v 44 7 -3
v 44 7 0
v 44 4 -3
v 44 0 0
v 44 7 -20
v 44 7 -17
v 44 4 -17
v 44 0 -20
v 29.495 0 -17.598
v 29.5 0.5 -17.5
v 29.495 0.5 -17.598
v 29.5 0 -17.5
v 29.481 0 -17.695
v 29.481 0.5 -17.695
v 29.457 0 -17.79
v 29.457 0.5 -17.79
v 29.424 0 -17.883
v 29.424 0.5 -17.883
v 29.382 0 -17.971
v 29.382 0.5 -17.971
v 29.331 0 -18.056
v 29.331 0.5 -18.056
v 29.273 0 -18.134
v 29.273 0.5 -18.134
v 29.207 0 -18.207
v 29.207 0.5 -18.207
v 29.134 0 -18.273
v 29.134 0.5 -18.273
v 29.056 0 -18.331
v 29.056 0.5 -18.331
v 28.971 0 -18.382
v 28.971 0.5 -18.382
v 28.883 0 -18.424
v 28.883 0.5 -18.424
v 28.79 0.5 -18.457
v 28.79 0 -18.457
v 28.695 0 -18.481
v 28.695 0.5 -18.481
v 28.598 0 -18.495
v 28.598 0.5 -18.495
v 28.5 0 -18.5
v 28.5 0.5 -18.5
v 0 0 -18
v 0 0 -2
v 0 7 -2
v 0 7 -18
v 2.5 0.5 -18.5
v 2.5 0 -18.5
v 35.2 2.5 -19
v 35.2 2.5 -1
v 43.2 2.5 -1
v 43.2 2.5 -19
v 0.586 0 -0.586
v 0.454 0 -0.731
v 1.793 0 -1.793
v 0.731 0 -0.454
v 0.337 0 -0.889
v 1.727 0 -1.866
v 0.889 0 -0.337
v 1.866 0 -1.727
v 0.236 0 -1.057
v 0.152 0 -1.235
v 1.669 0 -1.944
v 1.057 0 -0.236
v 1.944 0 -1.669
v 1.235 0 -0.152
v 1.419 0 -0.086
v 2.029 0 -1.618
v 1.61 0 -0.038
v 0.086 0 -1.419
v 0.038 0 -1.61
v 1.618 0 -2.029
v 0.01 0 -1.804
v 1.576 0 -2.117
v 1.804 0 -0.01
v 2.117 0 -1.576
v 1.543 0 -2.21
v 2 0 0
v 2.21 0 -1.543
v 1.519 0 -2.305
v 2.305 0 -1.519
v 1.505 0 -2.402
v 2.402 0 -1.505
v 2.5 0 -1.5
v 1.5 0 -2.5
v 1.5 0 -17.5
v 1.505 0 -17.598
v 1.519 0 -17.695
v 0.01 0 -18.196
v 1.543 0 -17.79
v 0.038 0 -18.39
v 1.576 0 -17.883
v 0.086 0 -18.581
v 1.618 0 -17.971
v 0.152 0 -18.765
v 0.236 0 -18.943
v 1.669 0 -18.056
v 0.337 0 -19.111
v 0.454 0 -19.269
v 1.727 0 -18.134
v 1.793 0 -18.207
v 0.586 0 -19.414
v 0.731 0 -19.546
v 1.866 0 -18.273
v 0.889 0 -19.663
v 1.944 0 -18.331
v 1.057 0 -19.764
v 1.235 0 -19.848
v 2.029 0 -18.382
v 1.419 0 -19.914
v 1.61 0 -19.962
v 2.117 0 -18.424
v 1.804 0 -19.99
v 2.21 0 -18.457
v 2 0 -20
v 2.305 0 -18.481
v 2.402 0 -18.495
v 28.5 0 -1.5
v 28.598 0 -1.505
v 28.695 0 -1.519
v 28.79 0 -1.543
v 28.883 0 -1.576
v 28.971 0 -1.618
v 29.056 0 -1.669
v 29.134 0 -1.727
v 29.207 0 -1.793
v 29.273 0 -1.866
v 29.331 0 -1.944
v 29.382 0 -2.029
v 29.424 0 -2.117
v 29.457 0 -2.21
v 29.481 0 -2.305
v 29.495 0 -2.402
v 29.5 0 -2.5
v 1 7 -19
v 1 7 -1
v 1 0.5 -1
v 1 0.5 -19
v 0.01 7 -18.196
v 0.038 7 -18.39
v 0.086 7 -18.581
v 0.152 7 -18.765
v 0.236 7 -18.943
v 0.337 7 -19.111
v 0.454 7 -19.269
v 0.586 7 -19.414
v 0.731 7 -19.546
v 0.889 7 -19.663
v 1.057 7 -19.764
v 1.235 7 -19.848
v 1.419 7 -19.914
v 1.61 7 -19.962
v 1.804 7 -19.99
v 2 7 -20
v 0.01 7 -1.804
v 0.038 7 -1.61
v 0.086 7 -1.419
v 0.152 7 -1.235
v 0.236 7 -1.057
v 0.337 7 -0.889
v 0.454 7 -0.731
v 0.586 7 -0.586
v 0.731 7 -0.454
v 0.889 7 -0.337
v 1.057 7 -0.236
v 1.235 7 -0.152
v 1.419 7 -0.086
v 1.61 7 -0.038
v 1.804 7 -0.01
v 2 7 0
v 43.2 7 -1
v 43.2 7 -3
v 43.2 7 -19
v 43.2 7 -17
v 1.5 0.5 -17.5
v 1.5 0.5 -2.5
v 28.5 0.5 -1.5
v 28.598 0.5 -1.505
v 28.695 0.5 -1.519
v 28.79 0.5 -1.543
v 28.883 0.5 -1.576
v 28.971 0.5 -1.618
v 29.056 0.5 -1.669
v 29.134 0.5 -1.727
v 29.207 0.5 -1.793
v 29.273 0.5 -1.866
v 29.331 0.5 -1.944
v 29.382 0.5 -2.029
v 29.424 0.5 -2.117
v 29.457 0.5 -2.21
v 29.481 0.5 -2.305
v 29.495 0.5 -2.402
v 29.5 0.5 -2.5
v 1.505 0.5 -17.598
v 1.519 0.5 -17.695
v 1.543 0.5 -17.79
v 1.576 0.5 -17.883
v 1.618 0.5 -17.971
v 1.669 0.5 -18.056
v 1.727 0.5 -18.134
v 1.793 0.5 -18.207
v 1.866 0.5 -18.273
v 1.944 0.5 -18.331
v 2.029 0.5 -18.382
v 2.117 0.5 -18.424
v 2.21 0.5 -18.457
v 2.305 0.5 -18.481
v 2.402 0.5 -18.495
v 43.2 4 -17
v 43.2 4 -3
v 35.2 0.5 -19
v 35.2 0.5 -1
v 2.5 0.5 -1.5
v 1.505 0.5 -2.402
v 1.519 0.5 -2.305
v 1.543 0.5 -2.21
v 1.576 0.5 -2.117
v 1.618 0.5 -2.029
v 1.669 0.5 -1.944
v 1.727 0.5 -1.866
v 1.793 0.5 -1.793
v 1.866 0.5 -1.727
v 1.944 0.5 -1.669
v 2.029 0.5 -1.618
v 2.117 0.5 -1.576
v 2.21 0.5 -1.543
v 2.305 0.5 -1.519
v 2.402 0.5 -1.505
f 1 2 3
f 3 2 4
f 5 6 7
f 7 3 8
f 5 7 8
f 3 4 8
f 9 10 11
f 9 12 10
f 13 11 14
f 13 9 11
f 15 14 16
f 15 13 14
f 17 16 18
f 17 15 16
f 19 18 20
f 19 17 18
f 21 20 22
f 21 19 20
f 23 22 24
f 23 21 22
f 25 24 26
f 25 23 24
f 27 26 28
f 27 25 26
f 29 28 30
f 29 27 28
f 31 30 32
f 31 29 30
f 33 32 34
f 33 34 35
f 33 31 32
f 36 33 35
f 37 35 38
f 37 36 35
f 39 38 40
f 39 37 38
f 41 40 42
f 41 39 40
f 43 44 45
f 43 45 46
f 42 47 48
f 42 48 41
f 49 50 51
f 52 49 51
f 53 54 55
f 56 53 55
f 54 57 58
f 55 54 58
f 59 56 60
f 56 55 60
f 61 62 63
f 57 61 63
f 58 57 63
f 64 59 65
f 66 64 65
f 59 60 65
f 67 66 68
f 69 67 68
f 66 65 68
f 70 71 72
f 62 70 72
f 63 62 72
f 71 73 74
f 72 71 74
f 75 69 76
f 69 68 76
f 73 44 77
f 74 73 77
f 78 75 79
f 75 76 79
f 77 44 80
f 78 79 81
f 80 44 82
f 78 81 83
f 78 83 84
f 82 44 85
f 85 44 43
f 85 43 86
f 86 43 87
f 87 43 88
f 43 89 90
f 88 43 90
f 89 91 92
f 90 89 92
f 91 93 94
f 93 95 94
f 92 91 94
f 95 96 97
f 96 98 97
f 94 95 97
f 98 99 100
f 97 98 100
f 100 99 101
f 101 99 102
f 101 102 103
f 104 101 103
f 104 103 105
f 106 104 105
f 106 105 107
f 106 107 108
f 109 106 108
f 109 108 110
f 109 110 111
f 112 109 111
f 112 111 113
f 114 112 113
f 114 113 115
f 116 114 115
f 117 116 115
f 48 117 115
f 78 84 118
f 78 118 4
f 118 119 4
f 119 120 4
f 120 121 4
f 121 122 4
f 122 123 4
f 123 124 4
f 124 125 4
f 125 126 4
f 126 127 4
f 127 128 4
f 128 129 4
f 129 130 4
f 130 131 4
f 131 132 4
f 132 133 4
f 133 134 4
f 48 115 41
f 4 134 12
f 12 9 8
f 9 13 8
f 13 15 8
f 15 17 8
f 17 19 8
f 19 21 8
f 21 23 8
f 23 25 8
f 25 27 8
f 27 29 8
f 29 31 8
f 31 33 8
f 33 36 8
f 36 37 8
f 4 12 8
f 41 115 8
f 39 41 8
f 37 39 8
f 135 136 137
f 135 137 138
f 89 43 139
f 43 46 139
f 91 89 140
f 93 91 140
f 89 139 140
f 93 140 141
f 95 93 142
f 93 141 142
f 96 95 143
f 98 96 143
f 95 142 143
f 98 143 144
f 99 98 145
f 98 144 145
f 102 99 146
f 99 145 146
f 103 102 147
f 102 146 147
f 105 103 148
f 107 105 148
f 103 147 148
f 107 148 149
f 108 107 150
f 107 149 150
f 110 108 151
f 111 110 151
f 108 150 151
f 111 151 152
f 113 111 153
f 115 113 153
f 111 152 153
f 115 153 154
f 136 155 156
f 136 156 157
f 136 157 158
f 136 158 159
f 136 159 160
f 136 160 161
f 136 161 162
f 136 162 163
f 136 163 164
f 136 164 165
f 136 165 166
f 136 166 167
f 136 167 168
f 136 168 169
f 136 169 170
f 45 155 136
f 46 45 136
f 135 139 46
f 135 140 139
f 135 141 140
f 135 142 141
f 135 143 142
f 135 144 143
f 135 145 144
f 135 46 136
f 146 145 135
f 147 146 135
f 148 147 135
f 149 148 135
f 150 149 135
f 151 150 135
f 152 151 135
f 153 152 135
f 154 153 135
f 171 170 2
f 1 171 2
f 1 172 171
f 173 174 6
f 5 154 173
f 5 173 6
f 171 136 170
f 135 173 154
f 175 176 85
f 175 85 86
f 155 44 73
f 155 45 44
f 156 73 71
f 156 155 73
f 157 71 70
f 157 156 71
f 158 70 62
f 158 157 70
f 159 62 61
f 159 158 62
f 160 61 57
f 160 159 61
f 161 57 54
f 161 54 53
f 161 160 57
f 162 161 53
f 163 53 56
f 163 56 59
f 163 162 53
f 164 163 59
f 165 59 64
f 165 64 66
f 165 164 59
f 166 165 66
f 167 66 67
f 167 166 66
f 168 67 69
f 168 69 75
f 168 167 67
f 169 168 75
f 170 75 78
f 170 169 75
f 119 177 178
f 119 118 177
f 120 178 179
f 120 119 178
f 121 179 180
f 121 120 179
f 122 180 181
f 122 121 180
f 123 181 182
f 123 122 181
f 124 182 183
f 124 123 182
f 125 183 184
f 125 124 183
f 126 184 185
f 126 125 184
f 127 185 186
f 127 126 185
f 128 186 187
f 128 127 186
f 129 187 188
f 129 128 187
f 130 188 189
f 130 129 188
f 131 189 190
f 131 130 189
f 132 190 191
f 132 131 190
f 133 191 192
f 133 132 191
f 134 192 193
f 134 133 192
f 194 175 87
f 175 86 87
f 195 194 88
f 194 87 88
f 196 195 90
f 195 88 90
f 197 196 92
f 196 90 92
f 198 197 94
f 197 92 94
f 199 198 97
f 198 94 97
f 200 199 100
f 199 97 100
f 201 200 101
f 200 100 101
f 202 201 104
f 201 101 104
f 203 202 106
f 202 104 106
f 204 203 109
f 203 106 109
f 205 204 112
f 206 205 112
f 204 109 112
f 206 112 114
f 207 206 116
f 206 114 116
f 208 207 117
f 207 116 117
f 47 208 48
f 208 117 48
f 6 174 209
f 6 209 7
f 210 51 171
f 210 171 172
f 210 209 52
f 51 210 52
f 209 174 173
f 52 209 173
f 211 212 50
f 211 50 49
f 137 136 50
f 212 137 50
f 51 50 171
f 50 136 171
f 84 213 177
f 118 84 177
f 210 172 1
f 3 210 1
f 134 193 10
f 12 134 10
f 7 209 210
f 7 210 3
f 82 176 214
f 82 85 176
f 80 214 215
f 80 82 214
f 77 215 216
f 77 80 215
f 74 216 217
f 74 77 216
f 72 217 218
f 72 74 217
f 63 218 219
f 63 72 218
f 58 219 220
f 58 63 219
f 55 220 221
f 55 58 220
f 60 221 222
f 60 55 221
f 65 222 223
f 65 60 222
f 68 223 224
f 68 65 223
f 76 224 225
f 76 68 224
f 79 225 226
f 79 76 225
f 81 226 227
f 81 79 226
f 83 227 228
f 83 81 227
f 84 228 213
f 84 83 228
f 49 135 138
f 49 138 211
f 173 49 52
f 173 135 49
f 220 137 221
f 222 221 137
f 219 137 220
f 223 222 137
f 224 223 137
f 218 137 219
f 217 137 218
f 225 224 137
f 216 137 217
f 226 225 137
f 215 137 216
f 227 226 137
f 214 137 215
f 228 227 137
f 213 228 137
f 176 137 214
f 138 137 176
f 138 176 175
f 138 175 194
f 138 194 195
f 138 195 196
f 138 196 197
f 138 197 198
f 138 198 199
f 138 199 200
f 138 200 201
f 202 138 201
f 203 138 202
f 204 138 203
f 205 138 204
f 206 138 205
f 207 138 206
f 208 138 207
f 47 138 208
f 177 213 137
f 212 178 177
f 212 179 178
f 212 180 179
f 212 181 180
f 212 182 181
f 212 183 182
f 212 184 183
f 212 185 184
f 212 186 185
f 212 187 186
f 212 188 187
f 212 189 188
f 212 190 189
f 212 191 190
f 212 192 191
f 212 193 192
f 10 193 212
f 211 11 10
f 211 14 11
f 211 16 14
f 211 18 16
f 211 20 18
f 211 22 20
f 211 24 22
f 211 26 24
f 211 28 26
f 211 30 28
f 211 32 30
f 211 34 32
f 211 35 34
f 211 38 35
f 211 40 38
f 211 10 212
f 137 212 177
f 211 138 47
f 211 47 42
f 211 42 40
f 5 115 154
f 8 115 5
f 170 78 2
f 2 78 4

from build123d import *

# Parameters (mm, degrees)
SKETCH1_W           = 44
SKETCH1_H           = 20
BOSS_EXTRUDE1_DEPTH = 7
SKETCH2_W           = 42.2
SKETCH2_H           = 18
CUT_EXTRUDE1_DEPTH  = 6.5
CUT_EXTRUDE2_REACH  = 50.767
SKETCH3_W           = 28
SKETCH3_H           = 17
SKETCH4_W           = 8
SKETCH4_H           = 18
BOSS_EXTRUDE2_DEPTH = 2
SKETCH5_W           = 0.8
SKETCH5_H           = 14
CUT_EXTRUDE3_DEPTH  = 3
FILLET1_R           = 2
FILLET2_R           = 1


with BuildPart() as part:
    # Sketch1 → Boss-Extrude1 (new body)
    with BuildSketch(Plane(origin=(0, 0, 0), x_dir=(1, 0, 0), z_dir=(0, 1, 0))):
        with Locations((22, 10)):
            Rectangle(SKETCH1_W, SKETCH1_H)
    extrude(amount=BOSS_EXTRUDE1_DEPTH)

    # Sketch2 → Cut-Extrude1 (cut)
    with BuildSketch(Plane(origin=(0, 7, 0), x_dir=(1, 0, 0), z_dir=(0, 1, 0))):
        with Locations((22.1, 10)):
            Rectangle(SKETCH2_W, SKETCH2_H)
    extrude(amount=-CUT_EXTRUDE1_DEPTH, mode=Mode.SUBTRACT)

    # Sketch3 → Cut-Extrude2 (cut, up to next)
    with BuildSketch(Plane(origin=(0, 0.5, 0), x_dir=(1, 0, 0), z_dir=(0, 1, 0)), mode=Mode.PRIVATE) as cut_extrude2_sk1:
        with Locations((15.5, 10)):
            Rectangle(SKETCH3_W, SKETCH3_H)
    cut_extrude2_tool1 = extrude(cut_extrude2_sk1.sketch, amount=-CUT_EXTRUDE2_REACH, mode=Mode.PRIVATE) & part.part
    add(cut_extrude2_tool1.solids().sort_by_distance((15.5, 0.5, -10))[0], mode=Mode.SUBTRACT)

    # Sketch4 → Boss-Extrude2 (add)
    with BuildSketch(Plane(origin=(0, 0.5, 0), x_dir=(1, 0, 0), z_dir=(0, 1, 0))):
        with Locations((39.2, 10)):
            Rectangle(SKETCH4_W, SKETCH4_H)
    extrude(amount=BOSS_EXTRUDE2_DEPTH)

    # Sketch5 → Cut-Extrude3 (cut)
    with BuildSketch(Plane(origin=(0, 7, 0), x_dir=(1, 0, 0), z_dir=(0, 1, 0))):
        with Locations((43.6, 10)):
            Rectangle(SKETCH5_W, SKETCH5_H)
    extrude(amount=-CUT_EXTRUDE3_DEPTH, mode=Mode.SUBTRACT)

    # Fillet1
    fillet1_edges = [part.edges().sort_by_distance(p)[0] for p in [
        (0, 3.5, -20),
        (0, 3.5, 0),
    ]]
    fillet(fillet1_edges, radius=FILLET1_R)

    # Fillet2
    fillet2_edges = [part.edges().sort_by_distance(p)[0] for p in [
        (1.5, 0.25, -1.5),
        (1.5, 0.25, -18.5),
        (29.5, 0.25, -18.5),
        (29.5, 0.25, -1.5),
    ]]
    fillet(fillet2_edges, radius=FILLET2_R)


solid = part.part
